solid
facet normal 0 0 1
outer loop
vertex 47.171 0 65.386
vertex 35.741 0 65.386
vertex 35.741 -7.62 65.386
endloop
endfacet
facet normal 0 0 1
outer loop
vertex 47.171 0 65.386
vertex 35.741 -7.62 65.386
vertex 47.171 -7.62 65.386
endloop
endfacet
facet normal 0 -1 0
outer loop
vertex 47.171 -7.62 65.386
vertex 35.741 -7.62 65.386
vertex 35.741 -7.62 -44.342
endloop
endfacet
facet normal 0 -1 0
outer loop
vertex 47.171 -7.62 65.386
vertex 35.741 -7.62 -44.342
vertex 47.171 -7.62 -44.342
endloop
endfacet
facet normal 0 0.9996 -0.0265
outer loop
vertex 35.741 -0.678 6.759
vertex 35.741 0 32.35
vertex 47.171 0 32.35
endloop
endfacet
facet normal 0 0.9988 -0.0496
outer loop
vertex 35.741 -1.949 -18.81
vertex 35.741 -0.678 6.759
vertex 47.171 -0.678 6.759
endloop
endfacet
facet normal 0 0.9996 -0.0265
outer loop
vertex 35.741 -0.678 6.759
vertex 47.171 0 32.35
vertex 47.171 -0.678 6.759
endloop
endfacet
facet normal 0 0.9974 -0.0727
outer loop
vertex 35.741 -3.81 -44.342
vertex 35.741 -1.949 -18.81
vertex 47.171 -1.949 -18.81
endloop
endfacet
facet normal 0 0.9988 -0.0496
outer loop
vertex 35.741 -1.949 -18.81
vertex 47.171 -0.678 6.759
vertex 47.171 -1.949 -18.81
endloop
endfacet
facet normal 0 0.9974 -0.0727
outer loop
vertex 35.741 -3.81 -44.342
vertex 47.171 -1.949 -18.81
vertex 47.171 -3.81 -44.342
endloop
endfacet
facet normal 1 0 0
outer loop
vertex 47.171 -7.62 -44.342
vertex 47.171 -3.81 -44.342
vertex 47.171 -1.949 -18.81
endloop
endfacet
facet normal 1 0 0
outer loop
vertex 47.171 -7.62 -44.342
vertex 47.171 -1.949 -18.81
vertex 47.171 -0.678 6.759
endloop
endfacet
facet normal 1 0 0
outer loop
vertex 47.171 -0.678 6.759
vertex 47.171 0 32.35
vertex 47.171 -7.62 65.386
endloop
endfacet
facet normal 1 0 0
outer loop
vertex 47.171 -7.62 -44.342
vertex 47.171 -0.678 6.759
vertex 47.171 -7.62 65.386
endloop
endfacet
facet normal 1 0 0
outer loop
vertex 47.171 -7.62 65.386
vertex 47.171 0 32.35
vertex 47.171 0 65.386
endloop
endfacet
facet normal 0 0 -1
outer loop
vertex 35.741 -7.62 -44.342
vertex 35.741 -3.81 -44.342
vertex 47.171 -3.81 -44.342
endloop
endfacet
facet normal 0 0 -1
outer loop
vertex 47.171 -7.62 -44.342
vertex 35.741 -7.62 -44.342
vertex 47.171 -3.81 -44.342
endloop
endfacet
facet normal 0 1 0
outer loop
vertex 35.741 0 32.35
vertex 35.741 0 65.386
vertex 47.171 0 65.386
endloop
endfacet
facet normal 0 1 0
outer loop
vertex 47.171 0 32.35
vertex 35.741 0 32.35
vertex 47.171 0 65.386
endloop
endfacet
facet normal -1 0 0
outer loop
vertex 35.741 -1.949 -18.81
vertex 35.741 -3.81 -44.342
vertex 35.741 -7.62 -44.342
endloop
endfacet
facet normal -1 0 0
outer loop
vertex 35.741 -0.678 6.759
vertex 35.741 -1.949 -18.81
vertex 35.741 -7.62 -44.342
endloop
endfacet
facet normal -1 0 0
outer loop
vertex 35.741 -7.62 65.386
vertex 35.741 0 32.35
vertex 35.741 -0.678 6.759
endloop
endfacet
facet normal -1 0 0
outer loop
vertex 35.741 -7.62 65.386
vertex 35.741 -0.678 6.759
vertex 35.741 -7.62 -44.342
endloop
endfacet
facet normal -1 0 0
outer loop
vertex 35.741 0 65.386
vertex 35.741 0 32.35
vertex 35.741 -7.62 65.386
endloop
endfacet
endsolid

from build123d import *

# Parameters (mm, degrees)
F0_W     = 11.43
F0_H     = 109.728
F1_DEPTH = 7.62
F3_DEPTH = 25.4


with BuildPart() as f1:
    # F0 (on Front) → F1 (new body)
    with BuildSketch(Plane.XZ):
        with Locations((41.4564540316, 10.5215980716)):
            Rectangle(F0_W, F0_H)
    extrude(amount=F1_DEPTH)

    # F2 (on face) → F3 (cut)
    with BuildSketch(Plane.YZ.offset(47.1714540316)):
        with BuildLine():
            ThreePointArc((0, 32.3497010216), (-1.2394704753, -6.0294134076), (-3.81, -44.3424019284))
            Line((-3.81, -44.3424019284), (0, -44.3424019284))
            Line((0, -44.3424019284), (0, 32.3497010216))
        make_face()
    extrude(amount=-F3_DEPTH, mode=Mode.SUBTRACT)


solid = f1.part
